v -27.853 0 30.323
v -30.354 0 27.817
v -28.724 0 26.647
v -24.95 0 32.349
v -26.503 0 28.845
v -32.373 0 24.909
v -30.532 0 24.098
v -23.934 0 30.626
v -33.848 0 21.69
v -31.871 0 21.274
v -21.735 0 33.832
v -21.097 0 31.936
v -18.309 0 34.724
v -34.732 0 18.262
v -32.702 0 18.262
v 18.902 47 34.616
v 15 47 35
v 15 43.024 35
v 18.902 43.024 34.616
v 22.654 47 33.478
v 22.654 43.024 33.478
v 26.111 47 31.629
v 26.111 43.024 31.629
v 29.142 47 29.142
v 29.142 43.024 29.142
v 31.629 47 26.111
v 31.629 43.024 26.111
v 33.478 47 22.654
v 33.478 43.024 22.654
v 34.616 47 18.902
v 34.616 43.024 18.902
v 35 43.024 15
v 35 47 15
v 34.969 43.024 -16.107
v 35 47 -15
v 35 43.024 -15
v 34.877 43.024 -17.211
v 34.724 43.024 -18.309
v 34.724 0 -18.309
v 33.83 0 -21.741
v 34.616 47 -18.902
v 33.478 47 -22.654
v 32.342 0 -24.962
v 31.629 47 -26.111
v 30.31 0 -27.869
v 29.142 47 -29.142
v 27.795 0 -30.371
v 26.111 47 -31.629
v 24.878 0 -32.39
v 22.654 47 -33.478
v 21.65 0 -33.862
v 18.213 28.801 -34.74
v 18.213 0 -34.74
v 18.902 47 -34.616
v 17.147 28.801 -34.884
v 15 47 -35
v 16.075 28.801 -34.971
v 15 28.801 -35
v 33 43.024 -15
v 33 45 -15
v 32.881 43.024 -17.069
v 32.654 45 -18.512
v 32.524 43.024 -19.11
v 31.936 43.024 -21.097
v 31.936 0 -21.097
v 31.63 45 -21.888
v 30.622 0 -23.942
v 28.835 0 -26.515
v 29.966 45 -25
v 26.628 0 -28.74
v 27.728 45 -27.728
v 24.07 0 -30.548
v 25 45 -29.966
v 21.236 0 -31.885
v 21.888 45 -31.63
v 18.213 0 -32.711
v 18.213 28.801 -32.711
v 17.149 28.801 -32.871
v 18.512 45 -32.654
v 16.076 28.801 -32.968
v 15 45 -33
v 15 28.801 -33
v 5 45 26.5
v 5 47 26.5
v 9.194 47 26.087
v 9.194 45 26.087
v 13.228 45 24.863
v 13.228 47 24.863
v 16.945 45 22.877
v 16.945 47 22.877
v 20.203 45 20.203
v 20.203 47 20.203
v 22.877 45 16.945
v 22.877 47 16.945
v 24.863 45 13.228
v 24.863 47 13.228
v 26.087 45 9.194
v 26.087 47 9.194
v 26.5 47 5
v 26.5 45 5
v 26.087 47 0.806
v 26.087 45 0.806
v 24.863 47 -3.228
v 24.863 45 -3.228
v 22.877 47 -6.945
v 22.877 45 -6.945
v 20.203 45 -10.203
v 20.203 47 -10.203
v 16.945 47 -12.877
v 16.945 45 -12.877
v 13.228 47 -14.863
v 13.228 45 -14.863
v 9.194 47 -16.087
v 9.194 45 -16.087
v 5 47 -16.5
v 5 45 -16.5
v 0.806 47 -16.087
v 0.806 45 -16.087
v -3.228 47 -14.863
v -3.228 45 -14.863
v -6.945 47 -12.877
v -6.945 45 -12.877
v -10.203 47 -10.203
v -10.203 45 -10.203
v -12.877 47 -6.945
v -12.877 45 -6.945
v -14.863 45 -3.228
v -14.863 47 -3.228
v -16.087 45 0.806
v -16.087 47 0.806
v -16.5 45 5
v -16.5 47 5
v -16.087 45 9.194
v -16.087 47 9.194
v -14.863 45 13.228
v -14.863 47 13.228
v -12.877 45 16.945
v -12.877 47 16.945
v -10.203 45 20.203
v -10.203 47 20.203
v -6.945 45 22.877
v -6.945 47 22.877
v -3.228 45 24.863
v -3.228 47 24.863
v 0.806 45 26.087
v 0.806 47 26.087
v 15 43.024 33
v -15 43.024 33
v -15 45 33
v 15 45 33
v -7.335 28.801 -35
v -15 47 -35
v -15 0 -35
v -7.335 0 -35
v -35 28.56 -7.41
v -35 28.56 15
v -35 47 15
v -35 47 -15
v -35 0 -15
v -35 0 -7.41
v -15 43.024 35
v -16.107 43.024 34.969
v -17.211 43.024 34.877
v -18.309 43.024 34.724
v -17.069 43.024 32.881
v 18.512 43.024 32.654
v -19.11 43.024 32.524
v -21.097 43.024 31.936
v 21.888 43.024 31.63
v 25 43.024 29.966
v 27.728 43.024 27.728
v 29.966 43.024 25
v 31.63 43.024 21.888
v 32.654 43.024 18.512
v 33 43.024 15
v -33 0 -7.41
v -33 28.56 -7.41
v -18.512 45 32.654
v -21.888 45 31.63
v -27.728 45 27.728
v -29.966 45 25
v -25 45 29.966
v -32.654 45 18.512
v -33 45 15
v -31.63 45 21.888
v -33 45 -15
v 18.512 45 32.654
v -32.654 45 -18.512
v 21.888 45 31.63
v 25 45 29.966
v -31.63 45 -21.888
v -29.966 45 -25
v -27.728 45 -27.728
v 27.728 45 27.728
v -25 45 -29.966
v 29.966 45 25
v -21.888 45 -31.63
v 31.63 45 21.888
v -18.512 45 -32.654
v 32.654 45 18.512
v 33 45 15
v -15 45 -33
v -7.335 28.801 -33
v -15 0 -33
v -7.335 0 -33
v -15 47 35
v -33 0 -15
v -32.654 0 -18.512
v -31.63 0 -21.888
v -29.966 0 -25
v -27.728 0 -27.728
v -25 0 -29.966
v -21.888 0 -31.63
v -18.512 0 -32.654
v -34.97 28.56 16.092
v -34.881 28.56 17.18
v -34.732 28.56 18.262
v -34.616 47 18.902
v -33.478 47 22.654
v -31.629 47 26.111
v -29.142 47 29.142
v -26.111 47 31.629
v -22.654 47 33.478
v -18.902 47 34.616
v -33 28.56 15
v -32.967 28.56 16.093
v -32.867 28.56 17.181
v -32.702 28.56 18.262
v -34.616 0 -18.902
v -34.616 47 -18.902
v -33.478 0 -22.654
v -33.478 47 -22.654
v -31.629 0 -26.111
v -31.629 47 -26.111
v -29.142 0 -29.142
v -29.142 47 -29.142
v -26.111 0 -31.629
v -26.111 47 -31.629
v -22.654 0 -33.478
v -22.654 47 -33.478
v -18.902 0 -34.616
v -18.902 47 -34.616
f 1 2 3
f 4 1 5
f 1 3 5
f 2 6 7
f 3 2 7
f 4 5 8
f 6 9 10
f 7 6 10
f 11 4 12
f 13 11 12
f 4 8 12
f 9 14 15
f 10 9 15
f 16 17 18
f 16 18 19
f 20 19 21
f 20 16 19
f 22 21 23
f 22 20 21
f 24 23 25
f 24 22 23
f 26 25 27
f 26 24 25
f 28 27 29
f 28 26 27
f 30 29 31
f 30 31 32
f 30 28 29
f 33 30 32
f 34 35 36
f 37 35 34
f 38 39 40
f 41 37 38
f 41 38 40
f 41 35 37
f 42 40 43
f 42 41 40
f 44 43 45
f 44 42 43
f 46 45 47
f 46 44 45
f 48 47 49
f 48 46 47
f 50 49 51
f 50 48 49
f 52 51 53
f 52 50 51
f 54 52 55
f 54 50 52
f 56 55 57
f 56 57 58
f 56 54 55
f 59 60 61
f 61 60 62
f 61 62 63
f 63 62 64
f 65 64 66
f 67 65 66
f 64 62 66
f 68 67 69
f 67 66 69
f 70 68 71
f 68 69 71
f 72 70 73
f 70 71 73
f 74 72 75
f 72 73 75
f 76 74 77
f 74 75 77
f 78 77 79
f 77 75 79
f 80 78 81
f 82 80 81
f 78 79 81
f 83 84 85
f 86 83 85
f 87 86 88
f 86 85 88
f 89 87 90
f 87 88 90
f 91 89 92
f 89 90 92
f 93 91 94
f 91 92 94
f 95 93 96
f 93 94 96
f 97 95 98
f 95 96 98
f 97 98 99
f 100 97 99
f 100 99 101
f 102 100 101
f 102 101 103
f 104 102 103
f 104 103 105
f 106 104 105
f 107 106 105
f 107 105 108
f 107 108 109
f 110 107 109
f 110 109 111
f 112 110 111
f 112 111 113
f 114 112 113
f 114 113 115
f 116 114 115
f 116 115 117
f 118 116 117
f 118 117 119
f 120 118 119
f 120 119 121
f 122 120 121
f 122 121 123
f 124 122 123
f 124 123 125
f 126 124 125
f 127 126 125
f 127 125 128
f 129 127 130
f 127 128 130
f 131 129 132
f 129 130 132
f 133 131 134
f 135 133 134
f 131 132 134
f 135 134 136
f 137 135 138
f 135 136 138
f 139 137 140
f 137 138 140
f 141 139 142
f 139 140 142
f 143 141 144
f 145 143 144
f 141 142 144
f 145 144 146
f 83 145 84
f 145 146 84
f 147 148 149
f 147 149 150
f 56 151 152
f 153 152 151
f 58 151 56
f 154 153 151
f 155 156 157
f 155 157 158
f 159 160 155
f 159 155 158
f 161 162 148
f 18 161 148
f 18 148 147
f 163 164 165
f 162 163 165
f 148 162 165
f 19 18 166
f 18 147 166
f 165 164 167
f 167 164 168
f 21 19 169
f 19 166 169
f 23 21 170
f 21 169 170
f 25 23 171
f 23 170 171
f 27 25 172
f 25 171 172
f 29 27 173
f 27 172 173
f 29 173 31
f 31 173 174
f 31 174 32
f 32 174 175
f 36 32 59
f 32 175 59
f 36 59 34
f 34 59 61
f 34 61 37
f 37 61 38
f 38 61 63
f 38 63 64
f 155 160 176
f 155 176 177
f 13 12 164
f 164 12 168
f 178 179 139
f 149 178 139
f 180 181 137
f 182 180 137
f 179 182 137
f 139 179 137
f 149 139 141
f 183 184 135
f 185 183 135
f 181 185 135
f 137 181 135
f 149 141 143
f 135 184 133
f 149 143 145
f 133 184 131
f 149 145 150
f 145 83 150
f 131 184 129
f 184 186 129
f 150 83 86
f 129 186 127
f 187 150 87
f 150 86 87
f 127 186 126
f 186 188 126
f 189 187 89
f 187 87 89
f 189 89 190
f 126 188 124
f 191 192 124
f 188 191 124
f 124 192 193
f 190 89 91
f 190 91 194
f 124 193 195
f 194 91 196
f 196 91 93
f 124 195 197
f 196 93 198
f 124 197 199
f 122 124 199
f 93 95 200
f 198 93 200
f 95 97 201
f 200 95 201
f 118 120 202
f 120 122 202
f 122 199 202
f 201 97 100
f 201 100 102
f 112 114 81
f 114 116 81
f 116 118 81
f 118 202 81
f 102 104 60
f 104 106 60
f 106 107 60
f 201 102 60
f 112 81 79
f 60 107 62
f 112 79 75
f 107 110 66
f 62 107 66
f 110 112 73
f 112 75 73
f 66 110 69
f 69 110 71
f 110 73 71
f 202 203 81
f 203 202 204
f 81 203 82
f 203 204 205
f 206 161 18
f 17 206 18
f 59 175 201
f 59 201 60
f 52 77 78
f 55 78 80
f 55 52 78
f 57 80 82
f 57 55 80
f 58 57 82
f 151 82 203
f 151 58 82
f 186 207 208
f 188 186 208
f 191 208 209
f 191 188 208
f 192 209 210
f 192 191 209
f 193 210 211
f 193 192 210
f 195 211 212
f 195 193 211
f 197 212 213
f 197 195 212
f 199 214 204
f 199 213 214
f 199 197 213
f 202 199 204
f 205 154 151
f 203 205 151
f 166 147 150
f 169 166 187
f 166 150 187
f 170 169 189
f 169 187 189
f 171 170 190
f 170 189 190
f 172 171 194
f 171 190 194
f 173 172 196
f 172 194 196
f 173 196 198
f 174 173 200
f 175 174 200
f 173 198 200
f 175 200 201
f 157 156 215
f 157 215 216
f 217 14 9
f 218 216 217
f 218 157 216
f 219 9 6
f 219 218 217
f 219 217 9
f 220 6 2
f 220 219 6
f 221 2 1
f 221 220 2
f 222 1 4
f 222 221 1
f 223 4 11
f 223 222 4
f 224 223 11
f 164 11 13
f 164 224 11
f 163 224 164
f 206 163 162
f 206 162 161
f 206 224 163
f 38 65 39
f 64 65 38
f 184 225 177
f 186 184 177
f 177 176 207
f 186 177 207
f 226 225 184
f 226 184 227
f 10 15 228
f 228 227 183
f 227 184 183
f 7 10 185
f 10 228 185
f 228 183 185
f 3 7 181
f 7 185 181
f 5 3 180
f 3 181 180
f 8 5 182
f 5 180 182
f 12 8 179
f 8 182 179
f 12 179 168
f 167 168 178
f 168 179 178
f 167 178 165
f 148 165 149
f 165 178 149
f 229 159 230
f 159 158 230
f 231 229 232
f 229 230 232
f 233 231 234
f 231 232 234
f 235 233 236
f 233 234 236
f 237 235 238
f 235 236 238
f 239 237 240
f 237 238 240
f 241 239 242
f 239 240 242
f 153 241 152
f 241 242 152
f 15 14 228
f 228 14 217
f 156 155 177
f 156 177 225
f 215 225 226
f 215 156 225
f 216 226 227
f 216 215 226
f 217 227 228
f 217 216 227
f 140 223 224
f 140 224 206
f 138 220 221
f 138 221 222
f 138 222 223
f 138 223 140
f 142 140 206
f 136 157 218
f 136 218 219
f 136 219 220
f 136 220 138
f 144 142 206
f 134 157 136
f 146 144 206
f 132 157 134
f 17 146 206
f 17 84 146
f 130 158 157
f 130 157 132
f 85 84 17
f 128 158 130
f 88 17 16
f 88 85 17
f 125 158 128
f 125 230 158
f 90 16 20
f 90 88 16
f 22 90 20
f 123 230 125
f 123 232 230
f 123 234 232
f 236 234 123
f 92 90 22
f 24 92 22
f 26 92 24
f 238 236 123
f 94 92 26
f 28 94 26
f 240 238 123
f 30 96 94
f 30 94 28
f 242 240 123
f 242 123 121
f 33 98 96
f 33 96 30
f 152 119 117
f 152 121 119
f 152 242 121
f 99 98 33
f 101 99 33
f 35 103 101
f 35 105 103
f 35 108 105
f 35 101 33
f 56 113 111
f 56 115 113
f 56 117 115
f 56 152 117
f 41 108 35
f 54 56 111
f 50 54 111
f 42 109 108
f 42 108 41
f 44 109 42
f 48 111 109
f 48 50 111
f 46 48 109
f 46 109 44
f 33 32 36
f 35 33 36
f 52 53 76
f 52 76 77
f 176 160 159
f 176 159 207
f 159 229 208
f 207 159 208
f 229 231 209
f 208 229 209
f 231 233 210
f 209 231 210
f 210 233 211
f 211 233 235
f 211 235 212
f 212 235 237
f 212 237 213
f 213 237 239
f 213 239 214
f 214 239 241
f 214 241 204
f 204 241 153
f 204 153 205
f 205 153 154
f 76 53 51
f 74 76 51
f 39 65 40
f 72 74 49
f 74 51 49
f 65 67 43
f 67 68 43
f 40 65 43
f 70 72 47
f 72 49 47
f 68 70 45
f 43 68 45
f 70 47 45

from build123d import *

# Parameters (mm, degrees)
SKETCH1_W           = 70
SKETCH1_H           = 70
BOSS_EXTRUDE1_DEPTH = 47
FILLET1_R           = 20
SHELL1_T            = -2
SKETCH2_R           = 21.5
CUT_EXTRUDE1_DEPTH  = 69.256867786
SKETCH6_W           = 75
SKETCH6_H           = 43.024157236
CUT_EXTRUDE4_DEPTH  = 69.256867786
SKETCH7_W           = 25.54869255
SKETCH7_H           = 28.800793666
CUT_EXTRUDE5_DEPTH  = 10
SKETCH9_W           = 25.672093796
SKETCH9_H           = 28.560455229
CUT_EXTRUDE6_DEPTH  = 10


with BuildPart() as part:
    # Sketch1 → Boss-Extrude1 (new body)
    with BuildSketch(Plane(origin=(0, 0, 0), x_dir=(1, 0, 0), z_dir=(0, 1, 0))):
        Rectangle(SKETCH1_W, SKETCH1_H)
    extrude(amount=BOSS_EXTRUDE1_DEPTH)

    # Fillet1
    fillet1_edges = [part.edges().sort_by_distance(p)[0] for p in [
        (35, 23.5, 35),
        (-35, 23.5, 35),
        (-35, 23.5, -35),
        (35, 23.5, -35),
    ]]
    fillet(fillet1_edges, radius=FILLET1_R)

    # Shell1
    shell1_openings = [part.faces().sort_by_distance(p)[0] for p in [
        (0, 0, 0),
    ]]
    offset(amount=SHELL1_T, openings=shell1_openings, kind=Kind.INTERSECTION)

    # Sketch2 → Cut-Extrude1 (cut, through all)
    with BuildSketch(Plane(origin=(0, 47, 0), x_dir=(1, 0, 0), z_dir=(0, 1, 0))):
        with Locations(Location((5, -5, 0), (0, 0, 270))):
            Circle(SKETCH2_R)
    extrude(amount=-CUT_EXTRUDE1_DEPTH, mode=Mode.SUBTRACT)

    # Sketch6 → Cut-Extrude4 (cut, through all)
    with BuildSketch(Plane(origin=(0, 0, 0), x_dir=(0.7071067811865477, 0, -0.7071067811865475), z_dir=(0.7071067811865475, 0, 0.7071067811865477))):
        with Locations((0, 21.512078618)):
            Rectangle(SKETCH6_W, SKETCH6_H)
    extrude(amount=CUT_EXTRUDE4_DEPTH, mode=Mode.SUBTRACT)

    # Sketch7 → Cut-Extrude5 (cut)
    with BuildSketch(Plane(origin=(0, 0, -35), x_dir=(-1, 0, 0), z_dir=(0, 0, -1))):
        with Locations((-5.439128437, 14.400396833)):
            Rectangle(SKETCH7_W, SKETCH7_H)
    extrude(amount=-CUT_EXTRUDE5_DEPTH, mode=Mode.SUBTRACT)

    # Sketch9 → Cut-Extrude6 (cut)
    with BuildSketch(Plane.ZY.offset(35)):
        with Locations((5.425785495, 14.280227615)):
            Rectangle(SKETCH9_W, SKETCH9_H)
    extrude(amount=-CUT_EXTRUDE6_DEPTH, mode=Mode.SUBTRACT)


solid = part.part
